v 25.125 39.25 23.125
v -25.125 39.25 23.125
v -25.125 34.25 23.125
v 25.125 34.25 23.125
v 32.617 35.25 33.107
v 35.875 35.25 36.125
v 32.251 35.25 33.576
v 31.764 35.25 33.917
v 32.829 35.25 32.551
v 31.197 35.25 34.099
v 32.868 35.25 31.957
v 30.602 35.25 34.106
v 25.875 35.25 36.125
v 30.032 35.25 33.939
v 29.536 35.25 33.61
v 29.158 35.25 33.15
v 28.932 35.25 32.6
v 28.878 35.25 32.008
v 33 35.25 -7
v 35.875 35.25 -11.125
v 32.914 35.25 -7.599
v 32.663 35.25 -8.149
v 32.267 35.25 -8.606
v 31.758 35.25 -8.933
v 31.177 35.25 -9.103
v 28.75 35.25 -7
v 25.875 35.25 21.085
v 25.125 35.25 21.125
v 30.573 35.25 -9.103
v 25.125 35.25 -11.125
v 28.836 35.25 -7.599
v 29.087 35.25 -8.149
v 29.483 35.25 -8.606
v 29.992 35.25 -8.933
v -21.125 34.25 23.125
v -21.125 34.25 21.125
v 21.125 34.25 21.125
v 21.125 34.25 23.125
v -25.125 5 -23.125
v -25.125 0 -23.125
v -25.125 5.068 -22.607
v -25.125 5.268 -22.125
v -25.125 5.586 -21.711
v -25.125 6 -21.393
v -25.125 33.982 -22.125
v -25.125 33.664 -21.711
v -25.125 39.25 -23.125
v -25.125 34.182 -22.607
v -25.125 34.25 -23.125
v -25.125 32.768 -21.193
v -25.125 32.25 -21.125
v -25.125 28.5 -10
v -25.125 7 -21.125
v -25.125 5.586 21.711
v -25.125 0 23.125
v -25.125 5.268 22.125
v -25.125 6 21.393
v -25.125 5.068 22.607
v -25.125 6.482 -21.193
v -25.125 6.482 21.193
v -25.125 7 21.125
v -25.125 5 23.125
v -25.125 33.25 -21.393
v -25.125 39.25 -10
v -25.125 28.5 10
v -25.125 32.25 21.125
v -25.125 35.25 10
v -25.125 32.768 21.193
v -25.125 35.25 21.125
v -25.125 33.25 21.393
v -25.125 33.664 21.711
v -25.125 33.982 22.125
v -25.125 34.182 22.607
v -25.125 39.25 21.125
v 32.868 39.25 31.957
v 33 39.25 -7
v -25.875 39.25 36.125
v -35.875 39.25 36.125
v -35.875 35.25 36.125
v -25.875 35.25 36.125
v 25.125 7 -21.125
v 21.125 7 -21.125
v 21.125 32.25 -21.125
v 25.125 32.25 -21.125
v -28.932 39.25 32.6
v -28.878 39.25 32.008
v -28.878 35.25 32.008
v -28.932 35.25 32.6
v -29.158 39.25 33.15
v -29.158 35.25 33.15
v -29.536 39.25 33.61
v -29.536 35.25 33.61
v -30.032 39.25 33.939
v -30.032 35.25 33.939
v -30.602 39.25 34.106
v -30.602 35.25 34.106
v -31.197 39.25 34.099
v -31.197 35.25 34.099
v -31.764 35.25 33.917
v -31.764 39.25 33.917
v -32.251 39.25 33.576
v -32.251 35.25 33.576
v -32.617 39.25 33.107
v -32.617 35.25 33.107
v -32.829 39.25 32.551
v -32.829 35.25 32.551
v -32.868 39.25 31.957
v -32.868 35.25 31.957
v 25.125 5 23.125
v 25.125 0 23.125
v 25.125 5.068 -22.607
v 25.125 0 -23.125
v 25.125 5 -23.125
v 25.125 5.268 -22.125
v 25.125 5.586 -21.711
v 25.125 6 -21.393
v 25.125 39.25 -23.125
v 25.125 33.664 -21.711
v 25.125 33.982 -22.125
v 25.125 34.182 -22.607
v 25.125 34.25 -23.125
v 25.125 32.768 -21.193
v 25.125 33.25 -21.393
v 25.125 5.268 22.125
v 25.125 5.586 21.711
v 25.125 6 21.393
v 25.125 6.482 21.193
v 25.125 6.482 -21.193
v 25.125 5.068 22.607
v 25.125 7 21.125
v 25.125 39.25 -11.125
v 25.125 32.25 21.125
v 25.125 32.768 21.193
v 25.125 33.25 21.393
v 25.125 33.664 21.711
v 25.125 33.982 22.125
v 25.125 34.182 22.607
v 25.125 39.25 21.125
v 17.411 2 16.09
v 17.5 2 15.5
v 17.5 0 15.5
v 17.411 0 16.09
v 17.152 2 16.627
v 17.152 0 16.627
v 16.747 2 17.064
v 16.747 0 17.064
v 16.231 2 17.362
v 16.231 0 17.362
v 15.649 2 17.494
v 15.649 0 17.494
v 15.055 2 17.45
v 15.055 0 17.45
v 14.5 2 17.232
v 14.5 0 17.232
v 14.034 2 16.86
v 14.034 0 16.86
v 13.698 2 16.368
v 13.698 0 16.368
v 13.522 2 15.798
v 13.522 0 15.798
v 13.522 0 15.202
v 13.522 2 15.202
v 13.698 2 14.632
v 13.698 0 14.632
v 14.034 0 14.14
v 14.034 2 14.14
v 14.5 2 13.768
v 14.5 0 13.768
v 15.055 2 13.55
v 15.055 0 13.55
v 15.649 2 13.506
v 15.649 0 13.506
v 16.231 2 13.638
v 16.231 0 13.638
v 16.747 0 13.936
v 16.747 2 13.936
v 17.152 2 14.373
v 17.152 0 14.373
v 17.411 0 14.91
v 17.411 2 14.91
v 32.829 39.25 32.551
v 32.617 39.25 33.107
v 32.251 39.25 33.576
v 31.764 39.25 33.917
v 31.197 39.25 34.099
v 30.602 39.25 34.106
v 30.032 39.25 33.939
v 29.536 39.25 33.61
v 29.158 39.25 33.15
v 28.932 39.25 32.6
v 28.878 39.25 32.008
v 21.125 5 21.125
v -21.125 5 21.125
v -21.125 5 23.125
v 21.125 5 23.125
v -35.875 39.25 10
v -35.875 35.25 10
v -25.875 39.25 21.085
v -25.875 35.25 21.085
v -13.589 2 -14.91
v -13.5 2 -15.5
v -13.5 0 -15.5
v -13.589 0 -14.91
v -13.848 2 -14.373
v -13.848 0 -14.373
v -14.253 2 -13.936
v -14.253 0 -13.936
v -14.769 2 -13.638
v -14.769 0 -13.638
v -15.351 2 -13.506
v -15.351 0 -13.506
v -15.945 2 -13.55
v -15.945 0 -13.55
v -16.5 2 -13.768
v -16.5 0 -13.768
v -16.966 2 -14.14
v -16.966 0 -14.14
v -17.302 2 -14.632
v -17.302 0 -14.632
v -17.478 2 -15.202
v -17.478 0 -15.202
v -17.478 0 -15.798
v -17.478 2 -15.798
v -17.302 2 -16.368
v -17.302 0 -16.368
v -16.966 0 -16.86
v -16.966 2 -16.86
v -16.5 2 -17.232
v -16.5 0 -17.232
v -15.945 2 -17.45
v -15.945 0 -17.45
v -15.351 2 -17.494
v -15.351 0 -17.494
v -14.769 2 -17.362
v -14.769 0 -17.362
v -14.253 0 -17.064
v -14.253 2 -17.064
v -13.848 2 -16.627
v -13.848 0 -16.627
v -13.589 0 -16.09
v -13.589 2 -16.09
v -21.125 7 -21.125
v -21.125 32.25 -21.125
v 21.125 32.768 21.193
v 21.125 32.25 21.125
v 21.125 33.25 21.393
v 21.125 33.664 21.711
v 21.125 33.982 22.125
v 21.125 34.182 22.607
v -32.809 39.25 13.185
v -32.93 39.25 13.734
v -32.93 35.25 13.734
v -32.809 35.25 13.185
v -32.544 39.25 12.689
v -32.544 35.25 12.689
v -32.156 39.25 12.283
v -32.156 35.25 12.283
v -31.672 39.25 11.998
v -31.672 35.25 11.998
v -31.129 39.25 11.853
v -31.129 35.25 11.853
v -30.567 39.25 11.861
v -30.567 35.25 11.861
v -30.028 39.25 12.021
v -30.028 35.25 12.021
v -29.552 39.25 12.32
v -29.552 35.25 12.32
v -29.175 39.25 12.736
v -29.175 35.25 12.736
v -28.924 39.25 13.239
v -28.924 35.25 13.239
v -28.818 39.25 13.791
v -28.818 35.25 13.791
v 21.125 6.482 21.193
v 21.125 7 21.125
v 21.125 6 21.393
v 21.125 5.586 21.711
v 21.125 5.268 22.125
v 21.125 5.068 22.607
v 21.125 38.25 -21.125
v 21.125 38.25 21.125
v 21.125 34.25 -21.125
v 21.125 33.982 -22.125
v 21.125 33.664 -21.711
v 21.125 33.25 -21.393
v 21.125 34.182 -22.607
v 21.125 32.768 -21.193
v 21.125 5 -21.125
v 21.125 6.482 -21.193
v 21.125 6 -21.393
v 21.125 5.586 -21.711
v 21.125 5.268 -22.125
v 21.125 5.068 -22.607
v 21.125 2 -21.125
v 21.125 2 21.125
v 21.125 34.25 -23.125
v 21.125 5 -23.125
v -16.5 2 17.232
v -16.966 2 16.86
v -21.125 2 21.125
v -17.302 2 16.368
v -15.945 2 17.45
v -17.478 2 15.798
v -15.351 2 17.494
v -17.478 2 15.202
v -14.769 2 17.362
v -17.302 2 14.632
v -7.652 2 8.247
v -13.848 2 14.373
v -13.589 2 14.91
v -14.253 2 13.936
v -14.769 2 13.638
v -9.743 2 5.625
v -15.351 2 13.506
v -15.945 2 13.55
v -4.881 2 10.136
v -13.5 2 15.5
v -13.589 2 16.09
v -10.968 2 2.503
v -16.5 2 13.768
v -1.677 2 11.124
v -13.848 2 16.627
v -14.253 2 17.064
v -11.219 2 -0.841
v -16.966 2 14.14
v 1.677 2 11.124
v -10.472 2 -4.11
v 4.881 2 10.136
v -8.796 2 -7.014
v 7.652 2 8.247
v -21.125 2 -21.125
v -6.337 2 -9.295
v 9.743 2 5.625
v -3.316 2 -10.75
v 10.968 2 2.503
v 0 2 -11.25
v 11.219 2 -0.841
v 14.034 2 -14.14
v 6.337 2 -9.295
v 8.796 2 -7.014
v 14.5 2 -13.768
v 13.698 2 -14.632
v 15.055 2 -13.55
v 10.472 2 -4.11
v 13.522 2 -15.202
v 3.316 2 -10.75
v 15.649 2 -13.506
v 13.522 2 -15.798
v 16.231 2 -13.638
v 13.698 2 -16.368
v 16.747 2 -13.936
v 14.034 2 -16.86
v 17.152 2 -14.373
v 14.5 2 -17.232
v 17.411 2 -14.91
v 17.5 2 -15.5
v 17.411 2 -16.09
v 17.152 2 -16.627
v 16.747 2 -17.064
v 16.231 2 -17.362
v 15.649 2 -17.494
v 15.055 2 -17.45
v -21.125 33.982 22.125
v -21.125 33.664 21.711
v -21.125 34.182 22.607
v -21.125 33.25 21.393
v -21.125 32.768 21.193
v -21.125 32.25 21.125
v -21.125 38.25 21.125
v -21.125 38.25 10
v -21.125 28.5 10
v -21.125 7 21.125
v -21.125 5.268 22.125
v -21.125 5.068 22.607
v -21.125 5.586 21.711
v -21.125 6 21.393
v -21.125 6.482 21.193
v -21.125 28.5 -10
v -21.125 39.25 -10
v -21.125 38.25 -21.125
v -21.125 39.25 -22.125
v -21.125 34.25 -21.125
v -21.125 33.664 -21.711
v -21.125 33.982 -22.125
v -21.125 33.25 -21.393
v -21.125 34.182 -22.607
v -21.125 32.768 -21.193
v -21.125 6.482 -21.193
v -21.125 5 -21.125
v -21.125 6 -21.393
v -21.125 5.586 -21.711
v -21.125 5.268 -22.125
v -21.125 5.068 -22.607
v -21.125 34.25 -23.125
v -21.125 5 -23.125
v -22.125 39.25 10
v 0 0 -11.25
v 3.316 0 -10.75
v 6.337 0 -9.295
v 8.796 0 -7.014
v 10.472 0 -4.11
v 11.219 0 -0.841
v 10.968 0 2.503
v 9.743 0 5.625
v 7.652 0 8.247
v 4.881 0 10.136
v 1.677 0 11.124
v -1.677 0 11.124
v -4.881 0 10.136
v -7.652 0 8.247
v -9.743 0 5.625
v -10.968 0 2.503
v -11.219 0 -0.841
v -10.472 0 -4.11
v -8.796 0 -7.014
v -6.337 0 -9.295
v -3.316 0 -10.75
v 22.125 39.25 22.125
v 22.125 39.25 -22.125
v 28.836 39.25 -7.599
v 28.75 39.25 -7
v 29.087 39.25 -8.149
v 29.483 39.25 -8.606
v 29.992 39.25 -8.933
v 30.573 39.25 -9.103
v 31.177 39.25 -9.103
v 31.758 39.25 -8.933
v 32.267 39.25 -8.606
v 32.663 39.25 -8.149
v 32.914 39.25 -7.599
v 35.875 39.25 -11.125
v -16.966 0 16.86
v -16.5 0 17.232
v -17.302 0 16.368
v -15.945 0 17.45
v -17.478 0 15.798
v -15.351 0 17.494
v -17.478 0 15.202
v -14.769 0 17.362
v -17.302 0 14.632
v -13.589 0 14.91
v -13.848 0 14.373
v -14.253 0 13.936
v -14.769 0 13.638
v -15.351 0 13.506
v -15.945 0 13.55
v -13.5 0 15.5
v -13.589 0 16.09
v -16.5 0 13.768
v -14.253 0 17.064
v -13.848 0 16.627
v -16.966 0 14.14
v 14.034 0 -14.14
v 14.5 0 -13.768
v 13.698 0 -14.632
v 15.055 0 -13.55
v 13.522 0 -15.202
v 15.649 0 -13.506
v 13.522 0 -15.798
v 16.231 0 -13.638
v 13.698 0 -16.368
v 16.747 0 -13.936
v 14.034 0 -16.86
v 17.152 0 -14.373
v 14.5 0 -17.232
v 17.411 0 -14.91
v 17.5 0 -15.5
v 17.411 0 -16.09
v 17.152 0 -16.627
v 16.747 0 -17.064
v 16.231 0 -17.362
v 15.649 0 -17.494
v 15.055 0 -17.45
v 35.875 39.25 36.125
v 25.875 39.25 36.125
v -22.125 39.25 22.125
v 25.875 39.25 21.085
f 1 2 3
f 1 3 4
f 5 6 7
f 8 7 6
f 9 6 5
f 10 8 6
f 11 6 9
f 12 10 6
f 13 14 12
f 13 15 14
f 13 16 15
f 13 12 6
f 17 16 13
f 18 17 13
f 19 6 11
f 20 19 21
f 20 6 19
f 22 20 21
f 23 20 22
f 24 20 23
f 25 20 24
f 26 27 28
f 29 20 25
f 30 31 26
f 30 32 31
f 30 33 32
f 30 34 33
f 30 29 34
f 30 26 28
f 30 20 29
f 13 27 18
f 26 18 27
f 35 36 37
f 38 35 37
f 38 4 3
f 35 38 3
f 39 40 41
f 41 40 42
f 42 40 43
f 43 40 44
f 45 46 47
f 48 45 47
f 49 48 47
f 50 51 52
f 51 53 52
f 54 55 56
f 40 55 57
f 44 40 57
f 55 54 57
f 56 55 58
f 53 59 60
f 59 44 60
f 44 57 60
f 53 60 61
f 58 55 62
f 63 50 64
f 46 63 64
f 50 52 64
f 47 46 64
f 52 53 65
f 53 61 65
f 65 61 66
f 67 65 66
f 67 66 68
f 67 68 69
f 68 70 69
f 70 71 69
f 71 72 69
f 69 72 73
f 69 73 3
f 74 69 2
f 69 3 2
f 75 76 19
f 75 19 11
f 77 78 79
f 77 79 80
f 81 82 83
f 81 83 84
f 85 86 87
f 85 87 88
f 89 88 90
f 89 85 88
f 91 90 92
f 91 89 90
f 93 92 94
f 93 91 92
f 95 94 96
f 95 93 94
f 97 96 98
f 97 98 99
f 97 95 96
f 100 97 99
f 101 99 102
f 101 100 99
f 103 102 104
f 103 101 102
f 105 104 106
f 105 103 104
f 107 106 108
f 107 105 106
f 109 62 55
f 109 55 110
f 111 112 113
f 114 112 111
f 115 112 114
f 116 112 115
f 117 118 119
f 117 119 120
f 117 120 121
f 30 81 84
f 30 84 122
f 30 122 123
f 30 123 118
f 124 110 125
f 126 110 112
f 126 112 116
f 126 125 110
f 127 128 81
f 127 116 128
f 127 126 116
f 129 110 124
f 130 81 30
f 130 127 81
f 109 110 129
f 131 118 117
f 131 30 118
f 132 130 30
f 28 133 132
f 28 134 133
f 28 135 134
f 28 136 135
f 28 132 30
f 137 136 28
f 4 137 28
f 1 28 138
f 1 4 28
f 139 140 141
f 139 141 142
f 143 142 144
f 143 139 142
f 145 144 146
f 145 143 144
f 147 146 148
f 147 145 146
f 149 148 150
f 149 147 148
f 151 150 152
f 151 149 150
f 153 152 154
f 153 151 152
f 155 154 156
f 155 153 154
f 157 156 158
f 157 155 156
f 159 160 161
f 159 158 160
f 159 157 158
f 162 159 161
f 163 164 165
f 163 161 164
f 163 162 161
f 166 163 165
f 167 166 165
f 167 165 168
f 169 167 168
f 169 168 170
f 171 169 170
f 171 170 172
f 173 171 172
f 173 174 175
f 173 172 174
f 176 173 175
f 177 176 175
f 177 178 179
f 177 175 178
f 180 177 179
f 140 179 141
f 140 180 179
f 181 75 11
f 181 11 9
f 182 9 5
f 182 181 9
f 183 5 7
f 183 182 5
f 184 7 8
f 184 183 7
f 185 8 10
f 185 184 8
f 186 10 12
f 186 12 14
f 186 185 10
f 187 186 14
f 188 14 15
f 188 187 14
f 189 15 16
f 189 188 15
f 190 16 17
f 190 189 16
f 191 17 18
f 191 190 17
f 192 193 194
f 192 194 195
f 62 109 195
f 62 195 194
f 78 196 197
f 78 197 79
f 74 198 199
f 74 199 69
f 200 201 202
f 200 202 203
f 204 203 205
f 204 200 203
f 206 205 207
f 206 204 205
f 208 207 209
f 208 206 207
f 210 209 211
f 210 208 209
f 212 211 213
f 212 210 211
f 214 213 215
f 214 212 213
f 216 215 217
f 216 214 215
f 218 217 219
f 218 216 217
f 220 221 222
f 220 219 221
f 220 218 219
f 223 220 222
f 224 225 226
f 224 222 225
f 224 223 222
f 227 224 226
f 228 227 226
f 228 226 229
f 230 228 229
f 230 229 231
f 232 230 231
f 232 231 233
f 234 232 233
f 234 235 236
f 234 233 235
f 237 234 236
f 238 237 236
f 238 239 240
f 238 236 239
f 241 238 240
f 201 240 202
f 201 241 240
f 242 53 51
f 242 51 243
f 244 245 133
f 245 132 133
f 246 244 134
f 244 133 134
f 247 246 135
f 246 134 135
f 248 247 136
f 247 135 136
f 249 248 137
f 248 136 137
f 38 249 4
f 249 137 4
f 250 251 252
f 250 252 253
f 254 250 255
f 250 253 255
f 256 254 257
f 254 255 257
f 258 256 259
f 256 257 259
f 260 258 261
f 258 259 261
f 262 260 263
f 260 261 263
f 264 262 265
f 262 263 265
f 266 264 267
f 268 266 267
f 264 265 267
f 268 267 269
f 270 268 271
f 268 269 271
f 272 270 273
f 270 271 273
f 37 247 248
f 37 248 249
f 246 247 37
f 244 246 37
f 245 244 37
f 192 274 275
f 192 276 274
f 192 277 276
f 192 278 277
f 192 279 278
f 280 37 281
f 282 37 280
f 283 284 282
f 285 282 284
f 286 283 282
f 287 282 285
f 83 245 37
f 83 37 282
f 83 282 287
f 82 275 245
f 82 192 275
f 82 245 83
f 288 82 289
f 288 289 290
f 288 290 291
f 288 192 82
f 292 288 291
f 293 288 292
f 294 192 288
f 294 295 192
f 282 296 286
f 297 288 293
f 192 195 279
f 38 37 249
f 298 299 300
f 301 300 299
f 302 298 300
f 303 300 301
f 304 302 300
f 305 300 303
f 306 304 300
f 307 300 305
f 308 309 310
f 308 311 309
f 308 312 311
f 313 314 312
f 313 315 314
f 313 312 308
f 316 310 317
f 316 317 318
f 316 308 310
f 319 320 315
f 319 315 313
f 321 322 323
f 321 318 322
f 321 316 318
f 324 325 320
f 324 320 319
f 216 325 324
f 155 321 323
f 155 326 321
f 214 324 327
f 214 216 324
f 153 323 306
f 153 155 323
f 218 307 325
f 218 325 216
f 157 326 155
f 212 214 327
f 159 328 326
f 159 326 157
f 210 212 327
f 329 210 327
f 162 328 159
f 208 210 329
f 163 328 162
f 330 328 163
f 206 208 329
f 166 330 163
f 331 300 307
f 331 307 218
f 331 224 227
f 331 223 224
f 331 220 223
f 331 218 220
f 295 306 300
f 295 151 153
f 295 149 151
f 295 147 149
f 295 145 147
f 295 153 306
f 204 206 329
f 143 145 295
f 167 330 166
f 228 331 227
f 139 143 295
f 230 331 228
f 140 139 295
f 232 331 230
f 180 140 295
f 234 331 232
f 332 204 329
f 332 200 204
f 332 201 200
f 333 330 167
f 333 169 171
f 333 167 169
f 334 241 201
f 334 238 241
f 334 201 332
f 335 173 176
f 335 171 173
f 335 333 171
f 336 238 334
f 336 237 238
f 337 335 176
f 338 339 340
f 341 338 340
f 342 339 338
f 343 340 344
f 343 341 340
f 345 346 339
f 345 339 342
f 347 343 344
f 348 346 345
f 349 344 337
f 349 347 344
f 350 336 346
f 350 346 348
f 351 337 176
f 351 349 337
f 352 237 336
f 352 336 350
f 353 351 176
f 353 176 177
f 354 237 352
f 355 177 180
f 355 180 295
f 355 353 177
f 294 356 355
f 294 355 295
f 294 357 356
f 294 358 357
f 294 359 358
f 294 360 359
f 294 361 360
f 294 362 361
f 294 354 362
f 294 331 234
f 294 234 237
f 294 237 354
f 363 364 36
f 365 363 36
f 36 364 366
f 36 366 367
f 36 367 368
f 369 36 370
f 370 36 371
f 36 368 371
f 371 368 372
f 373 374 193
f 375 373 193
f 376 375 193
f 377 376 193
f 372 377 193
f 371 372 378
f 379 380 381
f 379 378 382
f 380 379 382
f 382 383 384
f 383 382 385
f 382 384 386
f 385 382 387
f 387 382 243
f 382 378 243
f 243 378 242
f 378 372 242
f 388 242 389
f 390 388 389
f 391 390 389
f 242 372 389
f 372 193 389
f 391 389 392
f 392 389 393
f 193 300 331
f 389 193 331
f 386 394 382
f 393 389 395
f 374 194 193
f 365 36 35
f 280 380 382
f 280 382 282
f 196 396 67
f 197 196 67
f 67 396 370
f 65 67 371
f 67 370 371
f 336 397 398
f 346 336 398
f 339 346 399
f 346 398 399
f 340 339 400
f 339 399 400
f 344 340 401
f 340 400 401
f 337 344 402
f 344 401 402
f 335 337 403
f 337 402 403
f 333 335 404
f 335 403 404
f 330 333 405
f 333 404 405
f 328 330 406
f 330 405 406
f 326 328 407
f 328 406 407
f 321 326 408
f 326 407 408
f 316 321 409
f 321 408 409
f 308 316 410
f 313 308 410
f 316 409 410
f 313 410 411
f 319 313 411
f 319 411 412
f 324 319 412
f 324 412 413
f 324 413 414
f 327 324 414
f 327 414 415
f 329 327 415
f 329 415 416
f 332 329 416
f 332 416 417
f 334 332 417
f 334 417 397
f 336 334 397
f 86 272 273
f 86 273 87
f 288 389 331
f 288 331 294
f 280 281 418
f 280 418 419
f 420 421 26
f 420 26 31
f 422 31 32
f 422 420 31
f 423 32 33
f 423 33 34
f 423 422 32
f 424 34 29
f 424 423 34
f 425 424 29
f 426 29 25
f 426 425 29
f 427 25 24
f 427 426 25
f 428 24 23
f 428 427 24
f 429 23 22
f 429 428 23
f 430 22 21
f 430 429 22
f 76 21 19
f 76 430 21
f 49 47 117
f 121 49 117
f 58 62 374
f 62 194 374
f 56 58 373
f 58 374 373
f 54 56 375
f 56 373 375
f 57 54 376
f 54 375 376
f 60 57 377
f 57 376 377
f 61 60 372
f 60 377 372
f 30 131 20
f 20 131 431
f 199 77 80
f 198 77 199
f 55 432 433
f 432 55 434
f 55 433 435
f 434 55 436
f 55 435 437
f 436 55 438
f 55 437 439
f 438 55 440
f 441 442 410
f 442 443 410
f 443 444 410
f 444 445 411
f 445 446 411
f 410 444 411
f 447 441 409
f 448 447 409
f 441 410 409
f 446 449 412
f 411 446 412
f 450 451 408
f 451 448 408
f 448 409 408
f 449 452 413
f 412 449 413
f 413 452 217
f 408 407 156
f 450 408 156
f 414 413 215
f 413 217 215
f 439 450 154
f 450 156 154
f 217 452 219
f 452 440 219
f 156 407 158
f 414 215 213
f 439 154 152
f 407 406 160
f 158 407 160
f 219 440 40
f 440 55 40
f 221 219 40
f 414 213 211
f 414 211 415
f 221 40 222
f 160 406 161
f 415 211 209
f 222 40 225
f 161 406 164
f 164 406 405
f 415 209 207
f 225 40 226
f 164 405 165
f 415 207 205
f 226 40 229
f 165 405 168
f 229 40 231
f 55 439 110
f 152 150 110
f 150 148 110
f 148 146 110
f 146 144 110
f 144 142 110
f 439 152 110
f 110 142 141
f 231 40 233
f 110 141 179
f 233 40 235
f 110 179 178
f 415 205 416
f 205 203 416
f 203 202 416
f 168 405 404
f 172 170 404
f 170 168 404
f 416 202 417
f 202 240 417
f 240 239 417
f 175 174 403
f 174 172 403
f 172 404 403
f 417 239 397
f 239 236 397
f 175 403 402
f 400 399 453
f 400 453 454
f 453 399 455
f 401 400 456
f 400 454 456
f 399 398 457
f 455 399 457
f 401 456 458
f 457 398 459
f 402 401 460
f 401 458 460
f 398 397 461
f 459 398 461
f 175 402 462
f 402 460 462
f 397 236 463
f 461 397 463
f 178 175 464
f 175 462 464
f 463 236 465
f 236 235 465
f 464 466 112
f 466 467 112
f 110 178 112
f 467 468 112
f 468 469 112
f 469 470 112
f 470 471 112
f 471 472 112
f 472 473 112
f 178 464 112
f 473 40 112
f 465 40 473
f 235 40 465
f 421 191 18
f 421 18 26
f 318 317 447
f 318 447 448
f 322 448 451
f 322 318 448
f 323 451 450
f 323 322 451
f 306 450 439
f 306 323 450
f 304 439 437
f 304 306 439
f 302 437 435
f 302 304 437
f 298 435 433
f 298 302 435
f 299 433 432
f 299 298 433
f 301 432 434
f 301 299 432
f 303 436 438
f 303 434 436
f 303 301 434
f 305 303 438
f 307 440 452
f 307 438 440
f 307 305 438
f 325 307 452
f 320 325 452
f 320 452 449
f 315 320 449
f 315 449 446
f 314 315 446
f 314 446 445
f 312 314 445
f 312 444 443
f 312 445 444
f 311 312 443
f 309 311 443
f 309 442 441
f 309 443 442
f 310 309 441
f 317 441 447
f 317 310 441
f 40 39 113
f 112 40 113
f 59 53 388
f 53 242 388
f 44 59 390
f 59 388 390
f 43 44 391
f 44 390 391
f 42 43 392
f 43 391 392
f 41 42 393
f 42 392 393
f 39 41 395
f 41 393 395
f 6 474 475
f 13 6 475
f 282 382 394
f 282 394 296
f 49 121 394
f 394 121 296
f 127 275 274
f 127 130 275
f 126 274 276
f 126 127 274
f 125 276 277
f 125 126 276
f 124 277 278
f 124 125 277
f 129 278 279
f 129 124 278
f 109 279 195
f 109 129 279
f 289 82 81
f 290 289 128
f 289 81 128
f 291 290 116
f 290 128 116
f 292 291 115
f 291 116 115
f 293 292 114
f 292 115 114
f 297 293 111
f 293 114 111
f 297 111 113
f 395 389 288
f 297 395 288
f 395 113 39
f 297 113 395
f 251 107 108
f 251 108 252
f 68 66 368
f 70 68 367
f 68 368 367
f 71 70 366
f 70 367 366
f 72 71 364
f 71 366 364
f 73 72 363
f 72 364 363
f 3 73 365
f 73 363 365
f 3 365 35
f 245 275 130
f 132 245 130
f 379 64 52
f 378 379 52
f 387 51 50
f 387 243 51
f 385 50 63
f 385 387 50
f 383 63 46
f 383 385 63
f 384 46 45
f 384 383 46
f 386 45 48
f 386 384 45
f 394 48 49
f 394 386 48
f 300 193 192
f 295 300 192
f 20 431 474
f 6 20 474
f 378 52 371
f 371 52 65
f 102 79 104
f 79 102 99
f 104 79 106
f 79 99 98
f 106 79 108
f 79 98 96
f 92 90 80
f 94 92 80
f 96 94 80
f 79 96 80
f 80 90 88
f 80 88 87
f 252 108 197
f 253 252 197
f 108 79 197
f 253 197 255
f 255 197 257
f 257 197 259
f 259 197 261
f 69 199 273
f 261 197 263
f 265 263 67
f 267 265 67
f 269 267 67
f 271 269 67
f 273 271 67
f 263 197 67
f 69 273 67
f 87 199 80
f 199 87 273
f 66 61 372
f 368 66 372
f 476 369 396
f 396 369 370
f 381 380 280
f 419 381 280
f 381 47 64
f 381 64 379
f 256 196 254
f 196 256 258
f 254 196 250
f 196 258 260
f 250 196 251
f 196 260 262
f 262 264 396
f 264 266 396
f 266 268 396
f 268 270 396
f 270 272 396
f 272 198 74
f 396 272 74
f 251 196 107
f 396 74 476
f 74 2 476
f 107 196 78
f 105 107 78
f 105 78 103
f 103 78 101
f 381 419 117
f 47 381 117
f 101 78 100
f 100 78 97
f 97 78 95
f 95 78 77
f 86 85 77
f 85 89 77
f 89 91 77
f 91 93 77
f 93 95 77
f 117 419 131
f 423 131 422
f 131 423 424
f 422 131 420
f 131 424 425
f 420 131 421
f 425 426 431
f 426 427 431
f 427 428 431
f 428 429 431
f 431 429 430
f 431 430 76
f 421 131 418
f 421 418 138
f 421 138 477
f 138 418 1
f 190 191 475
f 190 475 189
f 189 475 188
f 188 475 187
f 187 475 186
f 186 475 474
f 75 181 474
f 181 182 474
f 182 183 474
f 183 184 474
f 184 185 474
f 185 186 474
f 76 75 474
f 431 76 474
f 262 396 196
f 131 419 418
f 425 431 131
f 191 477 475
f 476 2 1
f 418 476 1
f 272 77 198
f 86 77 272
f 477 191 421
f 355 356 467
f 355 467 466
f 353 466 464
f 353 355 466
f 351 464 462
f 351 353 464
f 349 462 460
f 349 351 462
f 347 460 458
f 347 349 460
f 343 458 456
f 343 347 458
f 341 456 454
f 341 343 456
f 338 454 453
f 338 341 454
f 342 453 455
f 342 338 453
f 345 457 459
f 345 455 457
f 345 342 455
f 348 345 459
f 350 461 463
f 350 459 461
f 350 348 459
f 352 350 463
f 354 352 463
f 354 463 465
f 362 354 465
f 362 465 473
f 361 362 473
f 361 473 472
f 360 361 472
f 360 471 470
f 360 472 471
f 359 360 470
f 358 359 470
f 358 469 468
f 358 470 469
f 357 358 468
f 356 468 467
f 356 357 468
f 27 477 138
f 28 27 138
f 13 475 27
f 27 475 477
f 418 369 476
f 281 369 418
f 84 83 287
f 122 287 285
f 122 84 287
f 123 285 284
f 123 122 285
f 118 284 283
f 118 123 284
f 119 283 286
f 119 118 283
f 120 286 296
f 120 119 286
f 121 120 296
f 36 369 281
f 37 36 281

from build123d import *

# Parameters (mm, degrees)
SKETCH1_W                      = 42.25
SKETCH1_H                      = 42.25
BOSS_EXTRUDE1_DEPTH            = 2
CUT_EXTRUDE1_REACH             = 31.942
SKETCH7_R                      = 11.25
BOSS_EXTRUDE6_DEPTH            = 37.25
BOSS_EXTRUDE6_DEPTH_BACK       = 2
SKETCH9_W                      = 4
SKETCH9_H                      = 42.25
BOSS_EXTRUDE7_DEPTH            = 4
CUT_EXTRUDE2_REACH             = 83.034
SKETCH11_W                     = 10.75
SKETCH11_H                     = 20
CUT_EXTRUDE2_DIRECTION_2_DEPTH = 82.034425555
SKETCH12_W                     = 50.25
SKETCH12_H                     = 5
BOSS_EXTRUDE8_DEPTH            = 2
FILLET2_R                      = 2
CUT_EXTRUDE4_DEPTH             = 64.084021352
CUT_EXTRUDE4_DEPTH_BACK        = 64.084021352
SKETCH13_R                     = 2
CHAMFER1_SIZE                  = 1
CUT_EXTRUDE5_REACH             = 63.924
SKETCH14_W                     = 12.88865459
SKETCH14_H                     = 5.96822717
CUT_EXTRUDE5_DIRECTION_2_DEPTH = 62.924096683
BOSS_EXTRUDE9_DEPTH            = 4


with BuildPart() as part:
    # Sketch1 → Boss-Extrude1 (new body)
    with BuildSketch(Plane(origin=(0, 0, 0), x_dir=(1, 0, 0), z_dir=(0, 1, 0))):
        Rectangle(SKETCH1_W, SKETCH1_H)
    extrude(amount=BOSS_EXTRUDE1_DEPTH)

    # Sketch7 → Cut-Extrude1 (cut, up to next)
    with BuildSketch(Plane.XZ, mode=Mode.PRIVATE) as cut_extrude1_sk1:
        with Locations(Location((0, 0, 0), (0, 0, 270))):
            Circle(SKETCH7_R)
    cut_extrude1_tool1 = extrude(cut_extrude1_sk1.sketch, amount=-CUT_EXTRUDE1_REACH, mode=Mode.PRIVATE) & part.part
    add(cut_extrude1_tool1.solids().sort_by_distance((0, 0, 0))[0], mode=Mode.SUBTRACT)

    # Sketch9 → Boss-Extrude6 (add, two sides: drawn at the far end of the back side and taken through both)
    with BuildSketch(Plane(origin=(0, 2, 0), x_dir=(1, 0, 0), z_dir=(0, 1, 0)).offset(-BOSS_EXTRUDE6_DEPTH_BACK)):
        with Locations((-23.125, 0)):
            Rectangle(SKETCH9_W, SKETCH9_H)
        with Locations((23.125, 0)):
            Rectangle(SKETCH9_W, SKETCH9_H)
    extrude(amount=BOSS_EXTRUDE6_DEPTH + BOSS_EXTRUDE6_DEPTH_BACK)

    # Sketch8 → Boss-Extrude7 (add)
    # profile 1 of 2: a face of its own
    with BuildSketch(Plane(origin=(0, 39.25, 0), x_dir=(1, 0, 0), z_dir=(0, 1, 0))):
        Polygon((-25.125, -21.125), (-25.125, 11.125), (-35.875, 11.125), (-35.875, -36.125), (-25.875, -36.125), (-25.875, -21.085491291), align=None)
        with BuildLine():
            Line((-32.867964016, -31.957386071), (-33, 7))
            ThreePointArc((-33, 7), (-30.875, 9.125), (-28.75, 7))
            Line((-28.75, 7), (-28.878451254, -32.007555956))
            ThreePointArc((-28.878451254, -32.007555956), (-30.900148895, -34.124841877), (-32.867964016, -31.957386071))
        make_face(mode=Mode.SUBTRACT)
    # profile 2 of 2: a face of its own
    with BuildSketch(Plane(origin=(0, 39.25, 0), x_dir=(1, 0, 0), z_dir=(0, 1, 0))):
        Polygon((25.875, -21.085491291), (25.125, -21.125), (25.125, 11.125), (35.875, 11.125), (35.875, -36.125), (25.875, -36.125), align=None)
        with BuildLine():
            Line((28.878451254, -32.007555956), (28.75, 7))
            ThreePointArc((28.75, 7), (30.875, 9.125), (33, 7))
            Line((33, 7), (32.867964016, -31.957386071))
            ThreePointArc((32.867964016, -31.957386071), (30.900148895, -34.124841877), (28.878451254, -32.007555956))
        make_face(mode=Mode.SUBTRACT)
    extrude(amount=-BOSS_EXTRUDE7_DEPTH)

    # Sketch11 → Cut-Extrude2 (cut, up to next)
    with BuildSketch(Plane(origin=(-25.125, 0, 0), x_dir=(0, -1, 0), z_dir=(-1, 0, 0)), mode=Mode.PRIVATE) as cut_extrude2_sk1:
        with Locations((-33.875, 0)):
            Rectangle(SKETCH11_W, SKETCH11_H)
    cut_extrude2_tool1 = extrude(cut_extrude2_sk1.sketch, amount=-CUT_EXTRUDE2_REACH, mode=Mode.PRIVATE) & part.part
    add(cut_extrude2_tool1.solids().sort_by_distance((-25.125, 33.875, 0))[0], mode=Mode.SUBTRACT)

    # Sketch11 → Cut-Extrude2 direction 2 (cut)
    with BuildSketch(Plane(origin=(-25.125, 0, 0), x_dir=(0, -1, 0), z_dir=(-1, 0, 0))):
        with Locations((-33.875, 0)):
            Rectangle(SKETCH11_W, SKETCH11_H)
    extrude(amount=CUT_EXTRUDE2_DIRECTION_2_DEPTH, mode=Mode.SUBTRACT)

    # Sketch12 → Boss-Extrude8 (add)
    with BuildSketch(Plane.XY.offset(21.125)):
        with Locations((0, 36.75)):
            Rectangle(SKETCH12_W, SKETCH12_H)
        with Locations((0, 2.5)):
            Rectangle(SKETCH12_W, SKETCH12_H)
    boss_extrude8 = extrude(amount=BOSS_EXTRUDE8_DEPTH)

    # Mirror1: Boss-Extrude8 across plane
    add(boss_extrude8.mirror(Plane.XY))

    # Fillet2
    fillet2_edges = [part.edges().sort_by_distance(p)[0] for p in [
        (-23.125, 5, -21.125),
        (23.125, 5, -21.125),
        (23.125, 34.25, -21.125),
        (-23.125, 34.25, -21.125),
        (23.125, 34.25, 21.125),
        (23.125, 5, 21.125),
        (-23.125, 5, 21.125),
        (-23.125, 34.25, 21.125),
    ]]
    fillet(fillet2_edges, radius=FILLET2_R - 0.0001)  # a hair under: the kernel refuses the full size

    # Sketch13 → Cut-Extrude4 (cut, two sides: drawn at the far end of the back side and taken through both)
    with BuildSketch(Plane.XZ.offset(-2).offset(-CUT_EXTRUDE4_DEPTH_BACK)):
        with Locations((-15.499999999, 15.5)):
            Circle(SKETCH13_R)
        with Locations((15.500000001, 15.5)):
            Circle(SKETCH13_R)
        with Locations((15.500000001, -15.5)):
            Circle(SKETCH13_R)
        with Locations((-15.499999999, -15.5)):
            Circle(SKETCH13_R)
    extrude(amount=CUT_EXTRUDE4_DEPTH + CUT_EXTRUDE4_DEPTH_BACK, mode=Mode.SUBTRACT)

    # Chamfer1
    chamfer1_edges = [part.edges().sort_by_distance(p)[0] for p in [
        (0, 39.25, 21.125),
        (0, 39.25, -21.125),
        (-21.125, 39.25, 15.5625),
        (21.125, 39.25, 0),
    ]]
    chamfer(chamfer1_edges, length=CHAMFER1_SIZE)

    # Sketch14 → Cut-Extrude5 (cut, up to next)
    with BuildSketch(Plane.XZ.offset(-35.25), mode=Mode.PRIVATE) as cut_extrude5_sk1:
        with Locations((-31.569327295, -11.445399839)):
            Rectangle(SKETCH14_W, SKETCH14_H)
    cut_extrude5_tool1 = extrude(cut_extrude5_sk1.sketch, amount=-CUT_EXTRUDE5_REACH, mode=Mode.PRIVATE) & part.part
    add(cut_extrude5_tool1.solids().sort_by_distance((-31.569327, 35.25, -11.4454))[0], mode=Mode.SUBTRACT)

    # Sketch14 → Cut-Extrude5 direction 2 (cut)
    with BuildSketch(Plane.XZ.offset(-35.25)):
        with Locations((-31.569327295, -11.445399839)):
            Rectangle(SKETCH14_W, SKETCH14_H)
    extrude(amount=CUT_EXTRUDE5_DIRECTION_2_DEPTH, mode=Mode.SUBTRACT)

    # Sketch15 → Boss-Extrude9 (add)
    with BuildSketch(Plane.XZ.offset(-35.25)):
        with BuildLine():
            Line((-25.125, 10), (-35.875, 10))
            Line((-35.875, 10), (-35.875, 14))
            Line((-35.875, 14), (-32.933785094, 14))
            ThreePointArc((-32.933785094, 14), (-30.875982387, 11.837870103), (-28.81817968, 14))
            Line((-28.81817968, 14), (-25.125, 14))
            Line((-25.125, 14), (-25.125, 10))
        make_face()
    extrude(amount=-BOSS_EXTRUDE9_DEPTH)


solid = part.part
